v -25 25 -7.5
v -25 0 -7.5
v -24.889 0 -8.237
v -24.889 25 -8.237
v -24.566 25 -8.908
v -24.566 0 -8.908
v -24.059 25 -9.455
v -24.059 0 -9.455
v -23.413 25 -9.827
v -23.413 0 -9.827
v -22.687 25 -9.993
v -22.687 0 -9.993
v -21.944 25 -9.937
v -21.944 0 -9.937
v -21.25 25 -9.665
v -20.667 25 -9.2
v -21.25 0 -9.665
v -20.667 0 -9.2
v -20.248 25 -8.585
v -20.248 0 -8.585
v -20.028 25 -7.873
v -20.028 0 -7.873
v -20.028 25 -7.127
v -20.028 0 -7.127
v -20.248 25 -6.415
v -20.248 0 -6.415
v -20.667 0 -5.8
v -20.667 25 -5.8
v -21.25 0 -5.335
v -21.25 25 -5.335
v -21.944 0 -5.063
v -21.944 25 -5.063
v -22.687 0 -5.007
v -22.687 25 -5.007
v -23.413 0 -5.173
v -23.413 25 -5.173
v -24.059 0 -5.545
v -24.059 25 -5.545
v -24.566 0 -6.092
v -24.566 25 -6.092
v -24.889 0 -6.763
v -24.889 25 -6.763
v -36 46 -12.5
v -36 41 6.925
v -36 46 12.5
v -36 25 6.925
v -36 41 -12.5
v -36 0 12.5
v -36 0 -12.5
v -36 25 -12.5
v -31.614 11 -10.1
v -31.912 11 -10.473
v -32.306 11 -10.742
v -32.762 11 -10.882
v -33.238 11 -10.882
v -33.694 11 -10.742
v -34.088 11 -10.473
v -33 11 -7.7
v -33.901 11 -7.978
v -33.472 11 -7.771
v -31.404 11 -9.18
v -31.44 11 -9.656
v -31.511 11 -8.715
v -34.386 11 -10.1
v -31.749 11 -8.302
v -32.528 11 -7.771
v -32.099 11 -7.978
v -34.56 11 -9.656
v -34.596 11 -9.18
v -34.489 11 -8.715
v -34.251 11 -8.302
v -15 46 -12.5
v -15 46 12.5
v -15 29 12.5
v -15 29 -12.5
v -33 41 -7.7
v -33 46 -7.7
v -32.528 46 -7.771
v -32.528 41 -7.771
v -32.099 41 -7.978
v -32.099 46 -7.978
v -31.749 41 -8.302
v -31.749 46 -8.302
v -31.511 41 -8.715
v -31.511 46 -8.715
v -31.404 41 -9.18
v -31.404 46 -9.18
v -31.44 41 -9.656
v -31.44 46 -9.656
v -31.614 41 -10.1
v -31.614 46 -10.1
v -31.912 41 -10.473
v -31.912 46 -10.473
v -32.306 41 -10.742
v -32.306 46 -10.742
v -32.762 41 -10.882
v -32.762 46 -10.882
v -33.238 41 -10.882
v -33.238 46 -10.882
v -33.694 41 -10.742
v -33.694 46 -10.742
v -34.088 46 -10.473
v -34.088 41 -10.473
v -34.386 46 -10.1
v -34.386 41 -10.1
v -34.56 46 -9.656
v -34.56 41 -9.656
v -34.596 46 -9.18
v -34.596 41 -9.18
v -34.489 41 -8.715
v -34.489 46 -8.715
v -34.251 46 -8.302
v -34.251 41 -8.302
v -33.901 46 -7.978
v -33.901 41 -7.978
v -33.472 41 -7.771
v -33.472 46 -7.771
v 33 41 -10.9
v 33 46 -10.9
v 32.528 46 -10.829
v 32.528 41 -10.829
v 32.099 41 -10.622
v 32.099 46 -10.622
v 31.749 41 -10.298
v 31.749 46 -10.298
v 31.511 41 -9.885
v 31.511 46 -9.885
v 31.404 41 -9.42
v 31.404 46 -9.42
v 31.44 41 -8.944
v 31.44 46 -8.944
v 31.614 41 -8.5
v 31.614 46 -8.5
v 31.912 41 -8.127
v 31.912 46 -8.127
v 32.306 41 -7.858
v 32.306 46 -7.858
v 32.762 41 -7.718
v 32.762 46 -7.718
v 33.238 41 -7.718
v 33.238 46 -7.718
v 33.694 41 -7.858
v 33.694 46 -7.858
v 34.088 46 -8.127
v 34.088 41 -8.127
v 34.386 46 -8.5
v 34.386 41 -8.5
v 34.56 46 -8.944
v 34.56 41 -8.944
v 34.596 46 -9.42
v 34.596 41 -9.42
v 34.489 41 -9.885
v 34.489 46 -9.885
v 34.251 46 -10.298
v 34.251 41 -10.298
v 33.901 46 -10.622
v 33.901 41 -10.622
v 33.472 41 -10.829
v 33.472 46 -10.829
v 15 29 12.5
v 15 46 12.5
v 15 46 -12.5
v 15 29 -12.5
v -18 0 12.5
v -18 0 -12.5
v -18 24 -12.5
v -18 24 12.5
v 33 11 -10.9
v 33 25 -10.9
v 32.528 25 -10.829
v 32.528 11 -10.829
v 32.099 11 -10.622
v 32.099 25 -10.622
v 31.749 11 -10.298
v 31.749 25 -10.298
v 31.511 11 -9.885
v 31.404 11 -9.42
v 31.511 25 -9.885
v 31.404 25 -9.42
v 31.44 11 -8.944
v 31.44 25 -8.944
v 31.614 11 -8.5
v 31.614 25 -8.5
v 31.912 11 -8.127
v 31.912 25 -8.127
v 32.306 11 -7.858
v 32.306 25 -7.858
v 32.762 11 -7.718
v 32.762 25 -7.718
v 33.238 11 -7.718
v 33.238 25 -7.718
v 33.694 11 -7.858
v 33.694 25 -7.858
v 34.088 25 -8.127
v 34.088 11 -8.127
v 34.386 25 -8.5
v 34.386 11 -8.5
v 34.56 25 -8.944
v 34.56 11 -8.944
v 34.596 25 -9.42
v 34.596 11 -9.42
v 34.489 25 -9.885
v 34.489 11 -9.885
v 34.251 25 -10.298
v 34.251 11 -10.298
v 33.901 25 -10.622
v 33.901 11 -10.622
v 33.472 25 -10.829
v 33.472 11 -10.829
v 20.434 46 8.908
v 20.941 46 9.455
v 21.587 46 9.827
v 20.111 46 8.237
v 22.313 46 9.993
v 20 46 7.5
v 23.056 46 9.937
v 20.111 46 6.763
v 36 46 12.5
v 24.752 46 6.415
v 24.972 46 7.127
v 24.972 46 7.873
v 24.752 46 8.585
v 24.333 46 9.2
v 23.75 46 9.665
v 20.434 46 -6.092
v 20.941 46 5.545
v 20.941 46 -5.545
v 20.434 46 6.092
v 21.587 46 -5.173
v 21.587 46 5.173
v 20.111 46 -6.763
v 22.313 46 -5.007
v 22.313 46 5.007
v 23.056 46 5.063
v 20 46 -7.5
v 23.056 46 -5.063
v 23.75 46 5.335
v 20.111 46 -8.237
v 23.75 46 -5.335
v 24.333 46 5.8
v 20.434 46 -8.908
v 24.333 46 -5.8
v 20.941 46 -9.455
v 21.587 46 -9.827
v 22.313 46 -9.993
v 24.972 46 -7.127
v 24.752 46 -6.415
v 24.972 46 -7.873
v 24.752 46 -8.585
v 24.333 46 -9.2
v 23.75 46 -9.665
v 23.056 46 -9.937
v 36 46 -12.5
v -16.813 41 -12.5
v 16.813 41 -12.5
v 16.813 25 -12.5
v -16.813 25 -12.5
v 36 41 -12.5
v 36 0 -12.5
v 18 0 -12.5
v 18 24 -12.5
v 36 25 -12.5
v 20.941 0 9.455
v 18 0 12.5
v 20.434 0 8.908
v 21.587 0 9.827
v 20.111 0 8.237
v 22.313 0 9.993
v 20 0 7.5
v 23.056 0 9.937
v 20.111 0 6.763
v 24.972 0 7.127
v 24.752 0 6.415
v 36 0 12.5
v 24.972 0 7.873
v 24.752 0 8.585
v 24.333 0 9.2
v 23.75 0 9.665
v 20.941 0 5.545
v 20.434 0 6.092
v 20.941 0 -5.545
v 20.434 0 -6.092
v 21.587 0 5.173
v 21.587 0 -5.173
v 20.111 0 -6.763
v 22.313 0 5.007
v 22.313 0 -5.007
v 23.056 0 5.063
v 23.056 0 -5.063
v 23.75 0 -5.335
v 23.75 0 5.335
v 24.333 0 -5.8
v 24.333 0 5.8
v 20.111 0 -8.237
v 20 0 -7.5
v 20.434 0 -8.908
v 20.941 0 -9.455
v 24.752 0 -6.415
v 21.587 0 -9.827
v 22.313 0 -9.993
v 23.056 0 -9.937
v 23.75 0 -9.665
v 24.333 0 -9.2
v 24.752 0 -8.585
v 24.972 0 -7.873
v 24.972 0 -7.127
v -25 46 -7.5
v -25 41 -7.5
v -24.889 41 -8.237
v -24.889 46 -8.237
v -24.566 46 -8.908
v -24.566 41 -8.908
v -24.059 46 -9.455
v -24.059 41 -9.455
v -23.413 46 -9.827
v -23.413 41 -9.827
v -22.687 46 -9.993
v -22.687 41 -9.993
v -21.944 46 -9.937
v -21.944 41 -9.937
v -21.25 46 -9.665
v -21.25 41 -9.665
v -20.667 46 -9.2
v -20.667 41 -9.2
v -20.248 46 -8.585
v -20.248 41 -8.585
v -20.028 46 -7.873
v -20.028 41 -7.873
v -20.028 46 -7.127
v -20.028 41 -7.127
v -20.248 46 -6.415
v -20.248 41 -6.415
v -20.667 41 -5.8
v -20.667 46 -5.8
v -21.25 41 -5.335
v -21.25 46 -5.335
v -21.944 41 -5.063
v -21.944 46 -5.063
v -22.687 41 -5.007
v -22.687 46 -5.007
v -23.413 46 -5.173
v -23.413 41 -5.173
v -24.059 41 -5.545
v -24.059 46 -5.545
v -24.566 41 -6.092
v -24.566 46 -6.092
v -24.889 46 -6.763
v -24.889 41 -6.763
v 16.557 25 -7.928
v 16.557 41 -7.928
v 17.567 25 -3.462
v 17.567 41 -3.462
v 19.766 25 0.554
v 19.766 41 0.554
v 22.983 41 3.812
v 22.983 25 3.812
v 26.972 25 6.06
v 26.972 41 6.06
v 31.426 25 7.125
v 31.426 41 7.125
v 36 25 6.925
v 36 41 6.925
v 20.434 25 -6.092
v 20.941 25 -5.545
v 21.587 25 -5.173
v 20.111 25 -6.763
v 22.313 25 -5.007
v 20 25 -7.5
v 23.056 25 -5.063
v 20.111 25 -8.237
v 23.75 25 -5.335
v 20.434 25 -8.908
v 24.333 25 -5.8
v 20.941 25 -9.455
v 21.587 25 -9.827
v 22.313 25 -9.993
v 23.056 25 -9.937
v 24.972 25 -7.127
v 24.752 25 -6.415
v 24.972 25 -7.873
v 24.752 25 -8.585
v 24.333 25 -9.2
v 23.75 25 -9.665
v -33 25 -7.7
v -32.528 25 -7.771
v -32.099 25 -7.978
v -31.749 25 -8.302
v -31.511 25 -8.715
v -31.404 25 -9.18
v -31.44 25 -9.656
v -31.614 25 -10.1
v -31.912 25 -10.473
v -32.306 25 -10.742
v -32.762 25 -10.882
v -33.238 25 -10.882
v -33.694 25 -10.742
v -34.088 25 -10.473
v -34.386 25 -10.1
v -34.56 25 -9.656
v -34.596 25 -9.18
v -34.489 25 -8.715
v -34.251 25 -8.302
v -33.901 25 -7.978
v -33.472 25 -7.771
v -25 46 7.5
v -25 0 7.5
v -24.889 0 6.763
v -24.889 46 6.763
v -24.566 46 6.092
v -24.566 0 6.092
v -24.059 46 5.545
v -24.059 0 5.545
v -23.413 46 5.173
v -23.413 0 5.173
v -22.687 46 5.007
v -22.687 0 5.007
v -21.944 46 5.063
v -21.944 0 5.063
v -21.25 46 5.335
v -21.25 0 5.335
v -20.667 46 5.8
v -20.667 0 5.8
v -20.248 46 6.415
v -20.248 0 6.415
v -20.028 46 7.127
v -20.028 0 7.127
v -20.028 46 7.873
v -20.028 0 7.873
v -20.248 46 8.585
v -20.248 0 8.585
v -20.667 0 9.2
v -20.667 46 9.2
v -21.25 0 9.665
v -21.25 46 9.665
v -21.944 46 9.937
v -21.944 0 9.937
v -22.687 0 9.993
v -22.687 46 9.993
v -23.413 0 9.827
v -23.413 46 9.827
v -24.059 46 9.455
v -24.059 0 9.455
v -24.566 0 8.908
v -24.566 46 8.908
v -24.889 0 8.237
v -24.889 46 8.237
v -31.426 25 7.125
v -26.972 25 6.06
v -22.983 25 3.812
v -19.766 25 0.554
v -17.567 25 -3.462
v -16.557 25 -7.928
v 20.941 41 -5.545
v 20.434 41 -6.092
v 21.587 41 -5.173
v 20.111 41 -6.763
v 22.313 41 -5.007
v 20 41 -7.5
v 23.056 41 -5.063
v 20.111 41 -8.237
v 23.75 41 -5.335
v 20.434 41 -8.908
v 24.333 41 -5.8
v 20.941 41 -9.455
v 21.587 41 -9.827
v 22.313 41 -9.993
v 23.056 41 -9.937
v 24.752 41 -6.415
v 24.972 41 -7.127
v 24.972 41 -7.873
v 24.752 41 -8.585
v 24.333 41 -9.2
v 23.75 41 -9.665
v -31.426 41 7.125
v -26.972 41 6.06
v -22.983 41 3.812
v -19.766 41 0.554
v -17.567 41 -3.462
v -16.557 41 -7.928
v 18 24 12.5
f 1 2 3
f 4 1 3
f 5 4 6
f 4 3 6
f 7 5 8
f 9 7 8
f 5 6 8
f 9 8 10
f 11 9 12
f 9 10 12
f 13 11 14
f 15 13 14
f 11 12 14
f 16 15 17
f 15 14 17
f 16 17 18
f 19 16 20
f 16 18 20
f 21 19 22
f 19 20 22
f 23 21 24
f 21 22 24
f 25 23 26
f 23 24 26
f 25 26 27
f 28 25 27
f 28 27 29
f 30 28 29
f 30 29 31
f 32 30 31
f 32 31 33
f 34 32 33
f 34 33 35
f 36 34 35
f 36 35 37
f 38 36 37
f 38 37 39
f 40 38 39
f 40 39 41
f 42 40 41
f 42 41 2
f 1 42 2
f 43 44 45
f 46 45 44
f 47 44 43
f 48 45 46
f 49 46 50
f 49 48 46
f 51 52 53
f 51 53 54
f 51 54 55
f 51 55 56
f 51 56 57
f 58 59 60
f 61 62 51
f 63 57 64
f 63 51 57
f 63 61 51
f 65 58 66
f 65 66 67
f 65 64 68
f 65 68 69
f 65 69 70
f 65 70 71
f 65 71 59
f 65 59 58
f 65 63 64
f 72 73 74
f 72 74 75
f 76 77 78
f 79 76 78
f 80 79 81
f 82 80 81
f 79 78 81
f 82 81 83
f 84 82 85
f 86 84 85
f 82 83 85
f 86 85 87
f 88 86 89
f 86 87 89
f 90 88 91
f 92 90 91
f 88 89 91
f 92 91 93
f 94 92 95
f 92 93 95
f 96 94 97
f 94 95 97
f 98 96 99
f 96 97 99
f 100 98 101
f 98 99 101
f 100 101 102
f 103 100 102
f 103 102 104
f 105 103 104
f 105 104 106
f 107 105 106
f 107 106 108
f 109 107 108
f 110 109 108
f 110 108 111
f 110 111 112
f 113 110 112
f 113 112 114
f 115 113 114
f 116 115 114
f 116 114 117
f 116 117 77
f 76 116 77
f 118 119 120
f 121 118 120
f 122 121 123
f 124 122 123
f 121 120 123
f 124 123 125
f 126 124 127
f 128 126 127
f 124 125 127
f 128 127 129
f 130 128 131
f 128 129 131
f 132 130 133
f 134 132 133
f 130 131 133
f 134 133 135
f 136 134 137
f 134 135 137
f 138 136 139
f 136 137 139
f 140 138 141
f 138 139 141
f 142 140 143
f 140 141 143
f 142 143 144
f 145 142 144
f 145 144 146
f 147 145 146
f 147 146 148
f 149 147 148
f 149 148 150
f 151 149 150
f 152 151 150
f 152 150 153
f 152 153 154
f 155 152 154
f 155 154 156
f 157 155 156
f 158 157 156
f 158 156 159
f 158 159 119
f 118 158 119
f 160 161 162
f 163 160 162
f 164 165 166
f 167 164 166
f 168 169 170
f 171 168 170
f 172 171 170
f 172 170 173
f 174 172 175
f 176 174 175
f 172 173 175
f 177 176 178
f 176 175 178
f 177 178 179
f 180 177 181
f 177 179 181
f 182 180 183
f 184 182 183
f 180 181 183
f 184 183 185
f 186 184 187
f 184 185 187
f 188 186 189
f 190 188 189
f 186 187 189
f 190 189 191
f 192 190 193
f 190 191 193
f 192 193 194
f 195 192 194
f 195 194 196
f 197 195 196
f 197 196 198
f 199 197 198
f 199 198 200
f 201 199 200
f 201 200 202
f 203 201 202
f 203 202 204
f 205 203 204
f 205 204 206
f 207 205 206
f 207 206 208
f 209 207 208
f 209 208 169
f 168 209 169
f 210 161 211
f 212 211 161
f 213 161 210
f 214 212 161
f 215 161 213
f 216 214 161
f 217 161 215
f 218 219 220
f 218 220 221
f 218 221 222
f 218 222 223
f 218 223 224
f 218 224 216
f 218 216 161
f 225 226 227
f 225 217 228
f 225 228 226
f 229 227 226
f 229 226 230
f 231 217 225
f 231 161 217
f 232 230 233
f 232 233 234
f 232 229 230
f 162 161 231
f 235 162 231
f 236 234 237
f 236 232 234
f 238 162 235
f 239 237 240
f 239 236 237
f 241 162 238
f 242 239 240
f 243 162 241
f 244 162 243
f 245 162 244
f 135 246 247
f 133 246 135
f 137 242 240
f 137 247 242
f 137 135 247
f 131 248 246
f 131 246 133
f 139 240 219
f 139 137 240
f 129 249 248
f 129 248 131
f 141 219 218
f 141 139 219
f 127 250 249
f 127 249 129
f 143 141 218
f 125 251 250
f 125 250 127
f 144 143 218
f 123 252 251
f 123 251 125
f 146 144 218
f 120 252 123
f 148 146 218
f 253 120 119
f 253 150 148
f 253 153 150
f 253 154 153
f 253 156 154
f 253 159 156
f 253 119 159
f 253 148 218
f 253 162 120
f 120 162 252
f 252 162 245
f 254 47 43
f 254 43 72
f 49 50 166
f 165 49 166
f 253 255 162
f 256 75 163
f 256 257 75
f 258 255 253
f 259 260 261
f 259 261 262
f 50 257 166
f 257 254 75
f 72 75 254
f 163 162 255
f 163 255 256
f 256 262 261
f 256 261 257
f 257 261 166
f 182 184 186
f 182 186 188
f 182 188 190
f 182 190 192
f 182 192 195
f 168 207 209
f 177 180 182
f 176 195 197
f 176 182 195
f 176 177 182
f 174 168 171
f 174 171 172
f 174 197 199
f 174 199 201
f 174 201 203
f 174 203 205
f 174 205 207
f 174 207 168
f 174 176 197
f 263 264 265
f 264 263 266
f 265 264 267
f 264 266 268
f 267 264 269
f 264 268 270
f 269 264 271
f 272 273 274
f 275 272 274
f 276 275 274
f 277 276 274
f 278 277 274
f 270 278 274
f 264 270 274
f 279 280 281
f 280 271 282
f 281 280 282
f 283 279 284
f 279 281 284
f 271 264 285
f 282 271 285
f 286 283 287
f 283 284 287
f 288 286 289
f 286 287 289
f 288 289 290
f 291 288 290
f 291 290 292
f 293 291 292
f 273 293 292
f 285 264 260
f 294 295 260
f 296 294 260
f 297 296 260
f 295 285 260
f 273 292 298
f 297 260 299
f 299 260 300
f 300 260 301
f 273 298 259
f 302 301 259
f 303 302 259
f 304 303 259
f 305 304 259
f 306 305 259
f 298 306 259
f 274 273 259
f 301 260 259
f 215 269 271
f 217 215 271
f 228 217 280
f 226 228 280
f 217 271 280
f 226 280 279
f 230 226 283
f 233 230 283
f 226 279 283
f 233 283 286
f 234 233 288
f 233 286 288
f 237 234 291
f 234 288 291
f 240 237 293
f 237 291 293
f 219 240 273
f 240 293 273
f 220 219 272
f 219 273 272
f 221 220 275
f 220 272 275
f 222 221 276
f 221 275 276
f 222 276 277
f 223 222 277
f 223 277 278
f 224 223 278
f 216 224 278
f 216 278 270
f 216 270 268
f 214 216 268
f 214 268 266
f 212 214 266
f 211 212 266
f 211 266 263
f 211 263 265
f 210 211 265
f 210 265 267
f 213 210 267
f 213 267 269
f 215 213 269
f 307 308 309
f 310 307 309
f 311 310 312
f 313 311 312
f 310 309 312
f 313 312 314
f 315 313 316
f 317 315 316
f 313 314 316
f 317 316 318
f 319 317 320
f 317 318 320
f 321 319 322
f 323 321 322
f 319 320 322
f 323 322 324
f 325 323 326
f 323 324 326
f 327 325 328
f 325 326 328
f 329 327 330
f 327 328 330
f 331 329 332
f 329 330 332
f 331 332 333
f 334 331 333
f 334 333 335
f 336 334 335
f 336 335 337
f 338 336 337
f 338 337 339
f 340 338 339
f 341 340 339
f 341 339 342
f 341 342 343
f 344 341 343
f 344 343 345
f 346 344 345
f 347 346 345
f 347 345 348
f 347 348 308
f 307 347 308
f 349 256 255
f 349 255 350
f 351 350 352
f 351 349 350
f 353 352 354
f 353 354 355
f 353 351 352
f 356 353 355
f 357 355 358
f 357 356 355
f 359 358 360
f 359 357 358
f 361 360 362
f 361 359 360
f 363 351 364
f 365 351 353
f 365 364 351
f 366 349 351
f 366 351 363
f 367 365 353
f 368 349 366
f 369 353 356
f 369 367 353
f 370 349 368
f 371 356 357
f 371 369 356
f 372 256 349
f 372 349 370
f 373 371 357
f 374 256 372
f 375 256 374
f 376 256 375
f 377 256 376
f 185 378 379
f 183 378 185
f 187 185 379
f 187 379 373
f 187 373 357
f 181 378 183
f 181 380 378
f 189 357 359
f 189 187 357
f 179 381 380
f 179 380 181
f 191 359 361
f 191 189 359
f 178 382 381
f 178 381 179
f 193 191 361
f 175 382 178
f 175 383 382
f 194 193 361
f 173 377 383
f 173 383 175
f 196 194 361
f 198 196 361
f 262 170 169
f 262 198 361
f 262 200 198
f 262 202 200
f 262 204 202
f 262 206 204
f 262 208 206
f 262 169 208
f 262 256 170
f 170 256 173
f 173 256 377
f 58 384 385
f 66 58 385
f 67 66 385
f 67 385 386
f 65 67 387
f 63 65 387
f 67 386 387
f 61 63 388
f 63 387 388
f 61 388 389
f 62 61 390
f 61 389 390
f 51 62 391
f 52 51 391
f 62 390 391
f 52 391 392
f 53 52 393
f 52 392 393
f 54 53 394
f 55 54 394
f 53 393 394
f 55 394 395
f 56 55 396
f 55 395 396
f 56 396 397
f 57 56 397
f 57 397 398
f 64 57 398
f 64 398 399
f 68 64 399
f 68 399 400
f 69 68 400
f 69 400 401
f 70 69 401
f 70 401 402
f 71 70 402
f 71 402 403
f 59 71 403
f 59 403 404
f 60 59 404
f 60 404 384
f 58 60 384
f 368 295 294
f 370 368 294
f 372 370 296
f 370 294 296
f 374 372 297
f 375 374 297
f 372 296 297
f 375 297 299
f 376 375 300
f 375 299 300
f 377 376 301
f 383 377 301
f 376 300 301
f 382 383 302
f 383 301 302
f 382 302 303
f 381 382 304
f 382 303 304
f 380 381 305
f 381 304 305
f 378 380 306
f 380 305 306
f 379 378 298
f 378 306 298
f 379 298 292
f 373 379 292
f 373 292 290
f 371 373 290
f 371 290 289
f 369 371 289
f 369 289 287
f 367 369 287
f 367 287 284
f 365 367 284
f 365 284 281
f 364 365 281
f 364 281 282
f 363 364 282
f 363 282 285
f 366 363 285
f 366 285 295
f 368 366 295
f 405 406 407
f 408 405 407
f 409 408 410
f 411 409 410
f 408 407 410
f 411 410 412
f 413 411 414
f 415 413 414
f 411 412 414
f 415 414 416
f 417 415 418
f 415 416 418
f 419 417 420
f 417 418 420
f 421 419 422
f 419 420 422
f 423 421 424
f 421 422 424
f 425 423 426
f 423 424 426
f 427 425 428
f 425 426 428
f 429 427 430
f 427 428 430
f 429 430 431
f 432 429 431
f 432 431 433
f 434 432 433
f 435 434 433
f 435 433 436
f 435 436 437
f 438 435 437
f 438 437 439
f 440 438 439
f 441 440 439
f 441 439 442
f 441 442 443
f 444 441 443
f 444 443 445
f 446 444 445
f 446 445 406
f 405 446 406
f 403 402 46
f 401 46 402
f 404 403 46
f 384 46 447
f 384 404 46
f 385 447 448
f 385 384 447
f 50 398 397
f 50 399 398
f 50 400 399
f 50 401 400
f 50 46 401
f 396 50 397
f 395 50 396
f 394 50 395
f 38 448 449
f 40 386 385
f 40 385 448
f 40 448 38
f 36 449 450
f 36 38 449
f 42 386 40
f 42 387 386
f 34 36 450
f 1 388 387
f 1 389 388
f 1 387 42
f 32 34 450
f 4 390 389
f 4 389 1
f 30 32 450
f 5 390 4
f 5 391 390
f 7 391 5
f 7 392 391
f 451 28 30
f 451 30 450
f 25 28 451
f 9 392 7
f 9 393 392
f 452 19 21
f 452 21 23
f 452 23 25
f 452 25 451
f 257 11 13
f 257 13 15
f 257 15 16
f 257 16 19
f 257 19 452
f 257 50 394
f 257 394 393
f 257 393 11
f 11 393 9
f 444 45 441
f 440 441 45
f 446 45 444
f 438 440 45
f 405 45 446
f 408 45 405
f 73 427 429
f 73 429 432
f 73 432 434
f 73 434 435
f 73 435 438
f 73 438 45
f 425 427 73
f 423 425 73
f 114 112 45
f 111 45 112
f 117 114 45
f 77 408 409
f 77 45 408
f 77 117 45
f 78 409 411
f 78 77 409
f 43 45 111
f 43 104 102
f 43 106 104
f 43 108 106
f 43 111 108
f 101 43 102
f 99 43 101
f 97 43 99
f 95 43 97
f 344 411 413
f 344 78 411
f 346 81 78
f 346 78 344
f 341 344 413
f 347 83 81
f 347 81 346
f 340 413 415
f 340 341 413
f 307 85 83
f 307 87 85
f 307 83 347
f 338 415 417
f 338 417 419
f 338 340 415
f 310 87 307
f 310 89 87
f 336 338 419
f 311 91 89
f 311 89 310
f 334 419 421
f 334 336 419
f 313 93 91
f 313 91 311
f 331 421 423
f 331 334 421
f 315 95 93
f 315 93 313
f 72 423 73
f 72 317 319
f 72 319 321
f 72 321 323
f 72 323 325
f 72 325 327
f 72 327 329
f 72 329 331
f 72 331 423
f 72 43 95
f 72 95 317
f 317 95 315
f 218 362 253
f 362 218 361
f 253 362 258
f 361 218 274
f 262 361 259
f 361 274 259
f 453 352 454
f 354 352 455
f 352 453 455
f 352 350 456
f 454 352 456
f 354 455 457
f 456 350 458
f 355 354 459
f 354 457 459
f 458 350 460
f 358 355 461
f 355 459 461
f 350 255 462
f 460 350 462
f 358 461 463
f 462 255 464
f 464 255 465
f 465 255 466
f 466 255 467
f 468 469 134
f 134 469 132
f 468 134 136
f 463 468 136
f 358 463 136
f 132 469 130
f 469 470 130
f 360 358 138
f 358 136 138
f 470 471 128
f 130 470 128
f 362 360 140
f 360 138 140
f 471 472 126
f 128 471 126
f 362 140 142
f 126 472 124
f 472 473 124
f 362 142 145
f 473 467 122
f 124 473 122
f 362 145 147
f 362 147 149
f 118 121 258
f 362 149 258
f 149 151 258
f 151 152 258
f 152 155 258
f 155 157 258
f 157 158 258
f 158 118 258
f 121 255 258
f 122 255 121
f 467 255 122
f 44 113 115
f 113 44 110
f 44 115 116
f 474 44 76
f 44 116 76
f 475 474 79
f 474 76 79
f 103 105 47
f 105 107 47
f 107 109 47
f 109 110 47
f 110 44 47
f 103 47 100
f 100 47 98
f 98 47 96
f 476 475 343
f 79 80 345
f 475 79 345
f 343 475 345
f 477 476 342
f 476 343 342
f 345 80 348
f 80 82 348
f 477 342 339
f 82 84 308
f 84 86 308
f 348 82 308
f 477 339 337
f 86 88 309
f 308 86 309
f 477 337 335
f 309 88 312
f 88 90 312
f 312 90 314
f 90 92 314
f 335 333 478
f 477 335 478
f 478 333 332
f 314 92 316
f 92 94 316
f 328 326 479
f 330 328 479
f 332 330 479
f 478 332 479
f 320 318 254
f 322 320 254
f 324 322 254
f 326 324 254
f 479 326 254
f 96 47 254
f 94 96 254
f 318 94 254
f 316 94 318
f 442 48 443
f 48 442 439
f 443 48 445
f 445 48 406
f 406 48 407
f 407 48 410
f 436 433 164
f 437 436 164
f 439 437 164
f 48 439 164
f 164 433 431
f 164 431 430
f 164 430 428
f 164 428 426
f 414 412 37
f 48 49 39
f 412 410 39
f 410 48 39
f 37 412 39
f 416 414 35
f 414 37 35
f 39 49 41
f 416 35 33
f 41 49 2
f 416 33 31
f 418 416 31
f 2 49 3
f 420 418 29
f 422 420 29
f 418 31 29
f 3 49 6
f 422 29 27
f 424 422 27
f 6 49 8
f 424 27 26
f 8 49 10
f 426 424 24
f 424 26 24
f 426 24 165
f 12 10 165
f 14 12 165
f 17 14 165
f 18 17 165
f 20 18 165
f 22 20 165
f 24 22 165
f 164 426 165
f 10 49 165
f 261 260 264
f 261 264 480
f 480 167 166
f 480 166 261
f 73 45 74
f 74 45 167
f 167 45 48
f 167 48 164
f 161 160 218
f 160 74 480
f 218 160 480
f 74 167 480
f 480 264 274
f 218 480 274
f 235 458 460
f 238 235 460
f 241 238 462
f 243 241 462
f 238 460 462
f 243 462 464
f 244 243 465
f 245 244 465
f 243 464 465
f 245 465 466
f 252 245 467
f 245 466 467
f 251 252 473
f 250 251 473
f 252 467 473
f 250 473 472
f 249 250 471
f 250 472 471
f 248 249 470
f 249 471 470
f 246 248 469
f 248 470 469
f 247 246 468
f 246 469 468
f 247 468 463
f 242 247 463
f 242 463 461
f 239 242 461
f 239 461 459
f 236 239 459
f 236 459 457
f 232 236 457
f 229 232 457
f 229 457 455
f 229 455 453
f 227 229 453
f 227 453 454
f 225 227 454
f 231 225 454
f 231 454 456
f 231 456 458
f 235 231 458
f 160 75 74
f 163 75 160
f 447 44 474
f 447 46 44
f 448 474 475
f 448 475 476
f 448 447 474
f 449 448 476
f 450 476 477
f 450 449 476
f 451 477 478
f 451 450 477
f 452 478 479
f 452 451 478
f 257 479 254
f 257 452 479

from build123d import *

# Parameters (mm, degrees)
SKETCH6_W           = 72
SKETCH6_H           = 25
BOSS_EXTRUDE2_DEPTH = 46
SKETCH9_R           = 1.6
CUT_EXTRUDE3_DEPTH  = 35
TOP_SCREW_HOLES_D   = 5
SKETCH12_W          = 36
SKETCH12_H          = 24
CUT_EXTRUDE4_DEPTH  = 64.537390567
SKETCH13_W          = 30
SKETCH13_H          = 25
CUT_EXTRUDE5_DEPTH  = 17
CUT_EXTRUDE6_START  = 25
SKETCH14_R          = 16.5
CUT_EXTRUDE6_DEPTH  = 16


with BuildPart() as part:
    # Sketch6 → Boss-Extrude2 (new body)
    with BuildSketch(Plane(origin=(0, 0, 0), x_dir=(1, 0, 0), z_dir=(0, 1, 0))):
        Rectangle(SKETCH6_W, SKETCH6_H)
    extrude(amount=BOSS_EXTRUDE2_DEPTH)

    # Sketch9 → Cut-Extrude3 (cut)
    with BuildSketch(Plane(origin=(0, 46, 0), x_dir=(1, 0, 0), z_dir=(0, 1, 0))):
        with Locations(Location((-33, 9.3, 0), (0, 0, 270))):
            Circle(SKETCH9_R)
        with Locations(Location((33, 9.3, 0), (0, 0, 90))):
            Circle(SKETCH9_R)
    extrude(amount=-CUT_EXTRUDE3_DEPTH, mode=Mode.SUBTRACT)

    # Top Screw Holes (through all)
    with Locations(Plane(origin=(0, 46, 0), x_dir=(1, 0, 0), z_dir=(0, 1, 0))):
        with Locations((-22.5, -7.5), (22.5, -7.5), (-22.5, 7.5), (22.5, 7.5)):
            Hole(TOP_SCREW_HOLES_D / 2)

    # Sketch12 → Cut-Extrude4 (cut, through all)
    with BuildSketch(Plane.XY.offset(12.5)):
        with Locations((0, 12)):
            Rectangle(SKETCH12_W, SKETCH12_H)
    extrude(amount=-CUT_EXTRUDE4_DEPTH, mode=Mode.SUBTRACT)

    # Sketch13 → Cut-Extrude5 (cut)
    with BuildSketch(Plane(origin=(0, 46, 0), x_dir=(1, 0, 0), z_dir=(0, 1, 0))):
        Rectangle(SKETCH13_W, SKETCH13_H)
    extrude(amount=-CUT_EXTRUDE5_DEPTH, mode=Mode.SUBTRACT)

    # Sketch14 → Cut-Extrude6 (cut)
    with BuildSketch(Plane(origin=(0, 0, 0), x_dir=(1, 0, 0), z_dir=(0, 1, 0)).offset(CUT_EXTRUDE6_START)):
        with Locations((-33, 9.3)):
            Circle(SKETCH14_R)
        with Locations((33, 9.3)):
            Circle(SKETCH14_R)
    extrude(amount=CUT_EXTRUDE6_DEPTH, mode=Mode.SUBTRACT)


solid = part.part
